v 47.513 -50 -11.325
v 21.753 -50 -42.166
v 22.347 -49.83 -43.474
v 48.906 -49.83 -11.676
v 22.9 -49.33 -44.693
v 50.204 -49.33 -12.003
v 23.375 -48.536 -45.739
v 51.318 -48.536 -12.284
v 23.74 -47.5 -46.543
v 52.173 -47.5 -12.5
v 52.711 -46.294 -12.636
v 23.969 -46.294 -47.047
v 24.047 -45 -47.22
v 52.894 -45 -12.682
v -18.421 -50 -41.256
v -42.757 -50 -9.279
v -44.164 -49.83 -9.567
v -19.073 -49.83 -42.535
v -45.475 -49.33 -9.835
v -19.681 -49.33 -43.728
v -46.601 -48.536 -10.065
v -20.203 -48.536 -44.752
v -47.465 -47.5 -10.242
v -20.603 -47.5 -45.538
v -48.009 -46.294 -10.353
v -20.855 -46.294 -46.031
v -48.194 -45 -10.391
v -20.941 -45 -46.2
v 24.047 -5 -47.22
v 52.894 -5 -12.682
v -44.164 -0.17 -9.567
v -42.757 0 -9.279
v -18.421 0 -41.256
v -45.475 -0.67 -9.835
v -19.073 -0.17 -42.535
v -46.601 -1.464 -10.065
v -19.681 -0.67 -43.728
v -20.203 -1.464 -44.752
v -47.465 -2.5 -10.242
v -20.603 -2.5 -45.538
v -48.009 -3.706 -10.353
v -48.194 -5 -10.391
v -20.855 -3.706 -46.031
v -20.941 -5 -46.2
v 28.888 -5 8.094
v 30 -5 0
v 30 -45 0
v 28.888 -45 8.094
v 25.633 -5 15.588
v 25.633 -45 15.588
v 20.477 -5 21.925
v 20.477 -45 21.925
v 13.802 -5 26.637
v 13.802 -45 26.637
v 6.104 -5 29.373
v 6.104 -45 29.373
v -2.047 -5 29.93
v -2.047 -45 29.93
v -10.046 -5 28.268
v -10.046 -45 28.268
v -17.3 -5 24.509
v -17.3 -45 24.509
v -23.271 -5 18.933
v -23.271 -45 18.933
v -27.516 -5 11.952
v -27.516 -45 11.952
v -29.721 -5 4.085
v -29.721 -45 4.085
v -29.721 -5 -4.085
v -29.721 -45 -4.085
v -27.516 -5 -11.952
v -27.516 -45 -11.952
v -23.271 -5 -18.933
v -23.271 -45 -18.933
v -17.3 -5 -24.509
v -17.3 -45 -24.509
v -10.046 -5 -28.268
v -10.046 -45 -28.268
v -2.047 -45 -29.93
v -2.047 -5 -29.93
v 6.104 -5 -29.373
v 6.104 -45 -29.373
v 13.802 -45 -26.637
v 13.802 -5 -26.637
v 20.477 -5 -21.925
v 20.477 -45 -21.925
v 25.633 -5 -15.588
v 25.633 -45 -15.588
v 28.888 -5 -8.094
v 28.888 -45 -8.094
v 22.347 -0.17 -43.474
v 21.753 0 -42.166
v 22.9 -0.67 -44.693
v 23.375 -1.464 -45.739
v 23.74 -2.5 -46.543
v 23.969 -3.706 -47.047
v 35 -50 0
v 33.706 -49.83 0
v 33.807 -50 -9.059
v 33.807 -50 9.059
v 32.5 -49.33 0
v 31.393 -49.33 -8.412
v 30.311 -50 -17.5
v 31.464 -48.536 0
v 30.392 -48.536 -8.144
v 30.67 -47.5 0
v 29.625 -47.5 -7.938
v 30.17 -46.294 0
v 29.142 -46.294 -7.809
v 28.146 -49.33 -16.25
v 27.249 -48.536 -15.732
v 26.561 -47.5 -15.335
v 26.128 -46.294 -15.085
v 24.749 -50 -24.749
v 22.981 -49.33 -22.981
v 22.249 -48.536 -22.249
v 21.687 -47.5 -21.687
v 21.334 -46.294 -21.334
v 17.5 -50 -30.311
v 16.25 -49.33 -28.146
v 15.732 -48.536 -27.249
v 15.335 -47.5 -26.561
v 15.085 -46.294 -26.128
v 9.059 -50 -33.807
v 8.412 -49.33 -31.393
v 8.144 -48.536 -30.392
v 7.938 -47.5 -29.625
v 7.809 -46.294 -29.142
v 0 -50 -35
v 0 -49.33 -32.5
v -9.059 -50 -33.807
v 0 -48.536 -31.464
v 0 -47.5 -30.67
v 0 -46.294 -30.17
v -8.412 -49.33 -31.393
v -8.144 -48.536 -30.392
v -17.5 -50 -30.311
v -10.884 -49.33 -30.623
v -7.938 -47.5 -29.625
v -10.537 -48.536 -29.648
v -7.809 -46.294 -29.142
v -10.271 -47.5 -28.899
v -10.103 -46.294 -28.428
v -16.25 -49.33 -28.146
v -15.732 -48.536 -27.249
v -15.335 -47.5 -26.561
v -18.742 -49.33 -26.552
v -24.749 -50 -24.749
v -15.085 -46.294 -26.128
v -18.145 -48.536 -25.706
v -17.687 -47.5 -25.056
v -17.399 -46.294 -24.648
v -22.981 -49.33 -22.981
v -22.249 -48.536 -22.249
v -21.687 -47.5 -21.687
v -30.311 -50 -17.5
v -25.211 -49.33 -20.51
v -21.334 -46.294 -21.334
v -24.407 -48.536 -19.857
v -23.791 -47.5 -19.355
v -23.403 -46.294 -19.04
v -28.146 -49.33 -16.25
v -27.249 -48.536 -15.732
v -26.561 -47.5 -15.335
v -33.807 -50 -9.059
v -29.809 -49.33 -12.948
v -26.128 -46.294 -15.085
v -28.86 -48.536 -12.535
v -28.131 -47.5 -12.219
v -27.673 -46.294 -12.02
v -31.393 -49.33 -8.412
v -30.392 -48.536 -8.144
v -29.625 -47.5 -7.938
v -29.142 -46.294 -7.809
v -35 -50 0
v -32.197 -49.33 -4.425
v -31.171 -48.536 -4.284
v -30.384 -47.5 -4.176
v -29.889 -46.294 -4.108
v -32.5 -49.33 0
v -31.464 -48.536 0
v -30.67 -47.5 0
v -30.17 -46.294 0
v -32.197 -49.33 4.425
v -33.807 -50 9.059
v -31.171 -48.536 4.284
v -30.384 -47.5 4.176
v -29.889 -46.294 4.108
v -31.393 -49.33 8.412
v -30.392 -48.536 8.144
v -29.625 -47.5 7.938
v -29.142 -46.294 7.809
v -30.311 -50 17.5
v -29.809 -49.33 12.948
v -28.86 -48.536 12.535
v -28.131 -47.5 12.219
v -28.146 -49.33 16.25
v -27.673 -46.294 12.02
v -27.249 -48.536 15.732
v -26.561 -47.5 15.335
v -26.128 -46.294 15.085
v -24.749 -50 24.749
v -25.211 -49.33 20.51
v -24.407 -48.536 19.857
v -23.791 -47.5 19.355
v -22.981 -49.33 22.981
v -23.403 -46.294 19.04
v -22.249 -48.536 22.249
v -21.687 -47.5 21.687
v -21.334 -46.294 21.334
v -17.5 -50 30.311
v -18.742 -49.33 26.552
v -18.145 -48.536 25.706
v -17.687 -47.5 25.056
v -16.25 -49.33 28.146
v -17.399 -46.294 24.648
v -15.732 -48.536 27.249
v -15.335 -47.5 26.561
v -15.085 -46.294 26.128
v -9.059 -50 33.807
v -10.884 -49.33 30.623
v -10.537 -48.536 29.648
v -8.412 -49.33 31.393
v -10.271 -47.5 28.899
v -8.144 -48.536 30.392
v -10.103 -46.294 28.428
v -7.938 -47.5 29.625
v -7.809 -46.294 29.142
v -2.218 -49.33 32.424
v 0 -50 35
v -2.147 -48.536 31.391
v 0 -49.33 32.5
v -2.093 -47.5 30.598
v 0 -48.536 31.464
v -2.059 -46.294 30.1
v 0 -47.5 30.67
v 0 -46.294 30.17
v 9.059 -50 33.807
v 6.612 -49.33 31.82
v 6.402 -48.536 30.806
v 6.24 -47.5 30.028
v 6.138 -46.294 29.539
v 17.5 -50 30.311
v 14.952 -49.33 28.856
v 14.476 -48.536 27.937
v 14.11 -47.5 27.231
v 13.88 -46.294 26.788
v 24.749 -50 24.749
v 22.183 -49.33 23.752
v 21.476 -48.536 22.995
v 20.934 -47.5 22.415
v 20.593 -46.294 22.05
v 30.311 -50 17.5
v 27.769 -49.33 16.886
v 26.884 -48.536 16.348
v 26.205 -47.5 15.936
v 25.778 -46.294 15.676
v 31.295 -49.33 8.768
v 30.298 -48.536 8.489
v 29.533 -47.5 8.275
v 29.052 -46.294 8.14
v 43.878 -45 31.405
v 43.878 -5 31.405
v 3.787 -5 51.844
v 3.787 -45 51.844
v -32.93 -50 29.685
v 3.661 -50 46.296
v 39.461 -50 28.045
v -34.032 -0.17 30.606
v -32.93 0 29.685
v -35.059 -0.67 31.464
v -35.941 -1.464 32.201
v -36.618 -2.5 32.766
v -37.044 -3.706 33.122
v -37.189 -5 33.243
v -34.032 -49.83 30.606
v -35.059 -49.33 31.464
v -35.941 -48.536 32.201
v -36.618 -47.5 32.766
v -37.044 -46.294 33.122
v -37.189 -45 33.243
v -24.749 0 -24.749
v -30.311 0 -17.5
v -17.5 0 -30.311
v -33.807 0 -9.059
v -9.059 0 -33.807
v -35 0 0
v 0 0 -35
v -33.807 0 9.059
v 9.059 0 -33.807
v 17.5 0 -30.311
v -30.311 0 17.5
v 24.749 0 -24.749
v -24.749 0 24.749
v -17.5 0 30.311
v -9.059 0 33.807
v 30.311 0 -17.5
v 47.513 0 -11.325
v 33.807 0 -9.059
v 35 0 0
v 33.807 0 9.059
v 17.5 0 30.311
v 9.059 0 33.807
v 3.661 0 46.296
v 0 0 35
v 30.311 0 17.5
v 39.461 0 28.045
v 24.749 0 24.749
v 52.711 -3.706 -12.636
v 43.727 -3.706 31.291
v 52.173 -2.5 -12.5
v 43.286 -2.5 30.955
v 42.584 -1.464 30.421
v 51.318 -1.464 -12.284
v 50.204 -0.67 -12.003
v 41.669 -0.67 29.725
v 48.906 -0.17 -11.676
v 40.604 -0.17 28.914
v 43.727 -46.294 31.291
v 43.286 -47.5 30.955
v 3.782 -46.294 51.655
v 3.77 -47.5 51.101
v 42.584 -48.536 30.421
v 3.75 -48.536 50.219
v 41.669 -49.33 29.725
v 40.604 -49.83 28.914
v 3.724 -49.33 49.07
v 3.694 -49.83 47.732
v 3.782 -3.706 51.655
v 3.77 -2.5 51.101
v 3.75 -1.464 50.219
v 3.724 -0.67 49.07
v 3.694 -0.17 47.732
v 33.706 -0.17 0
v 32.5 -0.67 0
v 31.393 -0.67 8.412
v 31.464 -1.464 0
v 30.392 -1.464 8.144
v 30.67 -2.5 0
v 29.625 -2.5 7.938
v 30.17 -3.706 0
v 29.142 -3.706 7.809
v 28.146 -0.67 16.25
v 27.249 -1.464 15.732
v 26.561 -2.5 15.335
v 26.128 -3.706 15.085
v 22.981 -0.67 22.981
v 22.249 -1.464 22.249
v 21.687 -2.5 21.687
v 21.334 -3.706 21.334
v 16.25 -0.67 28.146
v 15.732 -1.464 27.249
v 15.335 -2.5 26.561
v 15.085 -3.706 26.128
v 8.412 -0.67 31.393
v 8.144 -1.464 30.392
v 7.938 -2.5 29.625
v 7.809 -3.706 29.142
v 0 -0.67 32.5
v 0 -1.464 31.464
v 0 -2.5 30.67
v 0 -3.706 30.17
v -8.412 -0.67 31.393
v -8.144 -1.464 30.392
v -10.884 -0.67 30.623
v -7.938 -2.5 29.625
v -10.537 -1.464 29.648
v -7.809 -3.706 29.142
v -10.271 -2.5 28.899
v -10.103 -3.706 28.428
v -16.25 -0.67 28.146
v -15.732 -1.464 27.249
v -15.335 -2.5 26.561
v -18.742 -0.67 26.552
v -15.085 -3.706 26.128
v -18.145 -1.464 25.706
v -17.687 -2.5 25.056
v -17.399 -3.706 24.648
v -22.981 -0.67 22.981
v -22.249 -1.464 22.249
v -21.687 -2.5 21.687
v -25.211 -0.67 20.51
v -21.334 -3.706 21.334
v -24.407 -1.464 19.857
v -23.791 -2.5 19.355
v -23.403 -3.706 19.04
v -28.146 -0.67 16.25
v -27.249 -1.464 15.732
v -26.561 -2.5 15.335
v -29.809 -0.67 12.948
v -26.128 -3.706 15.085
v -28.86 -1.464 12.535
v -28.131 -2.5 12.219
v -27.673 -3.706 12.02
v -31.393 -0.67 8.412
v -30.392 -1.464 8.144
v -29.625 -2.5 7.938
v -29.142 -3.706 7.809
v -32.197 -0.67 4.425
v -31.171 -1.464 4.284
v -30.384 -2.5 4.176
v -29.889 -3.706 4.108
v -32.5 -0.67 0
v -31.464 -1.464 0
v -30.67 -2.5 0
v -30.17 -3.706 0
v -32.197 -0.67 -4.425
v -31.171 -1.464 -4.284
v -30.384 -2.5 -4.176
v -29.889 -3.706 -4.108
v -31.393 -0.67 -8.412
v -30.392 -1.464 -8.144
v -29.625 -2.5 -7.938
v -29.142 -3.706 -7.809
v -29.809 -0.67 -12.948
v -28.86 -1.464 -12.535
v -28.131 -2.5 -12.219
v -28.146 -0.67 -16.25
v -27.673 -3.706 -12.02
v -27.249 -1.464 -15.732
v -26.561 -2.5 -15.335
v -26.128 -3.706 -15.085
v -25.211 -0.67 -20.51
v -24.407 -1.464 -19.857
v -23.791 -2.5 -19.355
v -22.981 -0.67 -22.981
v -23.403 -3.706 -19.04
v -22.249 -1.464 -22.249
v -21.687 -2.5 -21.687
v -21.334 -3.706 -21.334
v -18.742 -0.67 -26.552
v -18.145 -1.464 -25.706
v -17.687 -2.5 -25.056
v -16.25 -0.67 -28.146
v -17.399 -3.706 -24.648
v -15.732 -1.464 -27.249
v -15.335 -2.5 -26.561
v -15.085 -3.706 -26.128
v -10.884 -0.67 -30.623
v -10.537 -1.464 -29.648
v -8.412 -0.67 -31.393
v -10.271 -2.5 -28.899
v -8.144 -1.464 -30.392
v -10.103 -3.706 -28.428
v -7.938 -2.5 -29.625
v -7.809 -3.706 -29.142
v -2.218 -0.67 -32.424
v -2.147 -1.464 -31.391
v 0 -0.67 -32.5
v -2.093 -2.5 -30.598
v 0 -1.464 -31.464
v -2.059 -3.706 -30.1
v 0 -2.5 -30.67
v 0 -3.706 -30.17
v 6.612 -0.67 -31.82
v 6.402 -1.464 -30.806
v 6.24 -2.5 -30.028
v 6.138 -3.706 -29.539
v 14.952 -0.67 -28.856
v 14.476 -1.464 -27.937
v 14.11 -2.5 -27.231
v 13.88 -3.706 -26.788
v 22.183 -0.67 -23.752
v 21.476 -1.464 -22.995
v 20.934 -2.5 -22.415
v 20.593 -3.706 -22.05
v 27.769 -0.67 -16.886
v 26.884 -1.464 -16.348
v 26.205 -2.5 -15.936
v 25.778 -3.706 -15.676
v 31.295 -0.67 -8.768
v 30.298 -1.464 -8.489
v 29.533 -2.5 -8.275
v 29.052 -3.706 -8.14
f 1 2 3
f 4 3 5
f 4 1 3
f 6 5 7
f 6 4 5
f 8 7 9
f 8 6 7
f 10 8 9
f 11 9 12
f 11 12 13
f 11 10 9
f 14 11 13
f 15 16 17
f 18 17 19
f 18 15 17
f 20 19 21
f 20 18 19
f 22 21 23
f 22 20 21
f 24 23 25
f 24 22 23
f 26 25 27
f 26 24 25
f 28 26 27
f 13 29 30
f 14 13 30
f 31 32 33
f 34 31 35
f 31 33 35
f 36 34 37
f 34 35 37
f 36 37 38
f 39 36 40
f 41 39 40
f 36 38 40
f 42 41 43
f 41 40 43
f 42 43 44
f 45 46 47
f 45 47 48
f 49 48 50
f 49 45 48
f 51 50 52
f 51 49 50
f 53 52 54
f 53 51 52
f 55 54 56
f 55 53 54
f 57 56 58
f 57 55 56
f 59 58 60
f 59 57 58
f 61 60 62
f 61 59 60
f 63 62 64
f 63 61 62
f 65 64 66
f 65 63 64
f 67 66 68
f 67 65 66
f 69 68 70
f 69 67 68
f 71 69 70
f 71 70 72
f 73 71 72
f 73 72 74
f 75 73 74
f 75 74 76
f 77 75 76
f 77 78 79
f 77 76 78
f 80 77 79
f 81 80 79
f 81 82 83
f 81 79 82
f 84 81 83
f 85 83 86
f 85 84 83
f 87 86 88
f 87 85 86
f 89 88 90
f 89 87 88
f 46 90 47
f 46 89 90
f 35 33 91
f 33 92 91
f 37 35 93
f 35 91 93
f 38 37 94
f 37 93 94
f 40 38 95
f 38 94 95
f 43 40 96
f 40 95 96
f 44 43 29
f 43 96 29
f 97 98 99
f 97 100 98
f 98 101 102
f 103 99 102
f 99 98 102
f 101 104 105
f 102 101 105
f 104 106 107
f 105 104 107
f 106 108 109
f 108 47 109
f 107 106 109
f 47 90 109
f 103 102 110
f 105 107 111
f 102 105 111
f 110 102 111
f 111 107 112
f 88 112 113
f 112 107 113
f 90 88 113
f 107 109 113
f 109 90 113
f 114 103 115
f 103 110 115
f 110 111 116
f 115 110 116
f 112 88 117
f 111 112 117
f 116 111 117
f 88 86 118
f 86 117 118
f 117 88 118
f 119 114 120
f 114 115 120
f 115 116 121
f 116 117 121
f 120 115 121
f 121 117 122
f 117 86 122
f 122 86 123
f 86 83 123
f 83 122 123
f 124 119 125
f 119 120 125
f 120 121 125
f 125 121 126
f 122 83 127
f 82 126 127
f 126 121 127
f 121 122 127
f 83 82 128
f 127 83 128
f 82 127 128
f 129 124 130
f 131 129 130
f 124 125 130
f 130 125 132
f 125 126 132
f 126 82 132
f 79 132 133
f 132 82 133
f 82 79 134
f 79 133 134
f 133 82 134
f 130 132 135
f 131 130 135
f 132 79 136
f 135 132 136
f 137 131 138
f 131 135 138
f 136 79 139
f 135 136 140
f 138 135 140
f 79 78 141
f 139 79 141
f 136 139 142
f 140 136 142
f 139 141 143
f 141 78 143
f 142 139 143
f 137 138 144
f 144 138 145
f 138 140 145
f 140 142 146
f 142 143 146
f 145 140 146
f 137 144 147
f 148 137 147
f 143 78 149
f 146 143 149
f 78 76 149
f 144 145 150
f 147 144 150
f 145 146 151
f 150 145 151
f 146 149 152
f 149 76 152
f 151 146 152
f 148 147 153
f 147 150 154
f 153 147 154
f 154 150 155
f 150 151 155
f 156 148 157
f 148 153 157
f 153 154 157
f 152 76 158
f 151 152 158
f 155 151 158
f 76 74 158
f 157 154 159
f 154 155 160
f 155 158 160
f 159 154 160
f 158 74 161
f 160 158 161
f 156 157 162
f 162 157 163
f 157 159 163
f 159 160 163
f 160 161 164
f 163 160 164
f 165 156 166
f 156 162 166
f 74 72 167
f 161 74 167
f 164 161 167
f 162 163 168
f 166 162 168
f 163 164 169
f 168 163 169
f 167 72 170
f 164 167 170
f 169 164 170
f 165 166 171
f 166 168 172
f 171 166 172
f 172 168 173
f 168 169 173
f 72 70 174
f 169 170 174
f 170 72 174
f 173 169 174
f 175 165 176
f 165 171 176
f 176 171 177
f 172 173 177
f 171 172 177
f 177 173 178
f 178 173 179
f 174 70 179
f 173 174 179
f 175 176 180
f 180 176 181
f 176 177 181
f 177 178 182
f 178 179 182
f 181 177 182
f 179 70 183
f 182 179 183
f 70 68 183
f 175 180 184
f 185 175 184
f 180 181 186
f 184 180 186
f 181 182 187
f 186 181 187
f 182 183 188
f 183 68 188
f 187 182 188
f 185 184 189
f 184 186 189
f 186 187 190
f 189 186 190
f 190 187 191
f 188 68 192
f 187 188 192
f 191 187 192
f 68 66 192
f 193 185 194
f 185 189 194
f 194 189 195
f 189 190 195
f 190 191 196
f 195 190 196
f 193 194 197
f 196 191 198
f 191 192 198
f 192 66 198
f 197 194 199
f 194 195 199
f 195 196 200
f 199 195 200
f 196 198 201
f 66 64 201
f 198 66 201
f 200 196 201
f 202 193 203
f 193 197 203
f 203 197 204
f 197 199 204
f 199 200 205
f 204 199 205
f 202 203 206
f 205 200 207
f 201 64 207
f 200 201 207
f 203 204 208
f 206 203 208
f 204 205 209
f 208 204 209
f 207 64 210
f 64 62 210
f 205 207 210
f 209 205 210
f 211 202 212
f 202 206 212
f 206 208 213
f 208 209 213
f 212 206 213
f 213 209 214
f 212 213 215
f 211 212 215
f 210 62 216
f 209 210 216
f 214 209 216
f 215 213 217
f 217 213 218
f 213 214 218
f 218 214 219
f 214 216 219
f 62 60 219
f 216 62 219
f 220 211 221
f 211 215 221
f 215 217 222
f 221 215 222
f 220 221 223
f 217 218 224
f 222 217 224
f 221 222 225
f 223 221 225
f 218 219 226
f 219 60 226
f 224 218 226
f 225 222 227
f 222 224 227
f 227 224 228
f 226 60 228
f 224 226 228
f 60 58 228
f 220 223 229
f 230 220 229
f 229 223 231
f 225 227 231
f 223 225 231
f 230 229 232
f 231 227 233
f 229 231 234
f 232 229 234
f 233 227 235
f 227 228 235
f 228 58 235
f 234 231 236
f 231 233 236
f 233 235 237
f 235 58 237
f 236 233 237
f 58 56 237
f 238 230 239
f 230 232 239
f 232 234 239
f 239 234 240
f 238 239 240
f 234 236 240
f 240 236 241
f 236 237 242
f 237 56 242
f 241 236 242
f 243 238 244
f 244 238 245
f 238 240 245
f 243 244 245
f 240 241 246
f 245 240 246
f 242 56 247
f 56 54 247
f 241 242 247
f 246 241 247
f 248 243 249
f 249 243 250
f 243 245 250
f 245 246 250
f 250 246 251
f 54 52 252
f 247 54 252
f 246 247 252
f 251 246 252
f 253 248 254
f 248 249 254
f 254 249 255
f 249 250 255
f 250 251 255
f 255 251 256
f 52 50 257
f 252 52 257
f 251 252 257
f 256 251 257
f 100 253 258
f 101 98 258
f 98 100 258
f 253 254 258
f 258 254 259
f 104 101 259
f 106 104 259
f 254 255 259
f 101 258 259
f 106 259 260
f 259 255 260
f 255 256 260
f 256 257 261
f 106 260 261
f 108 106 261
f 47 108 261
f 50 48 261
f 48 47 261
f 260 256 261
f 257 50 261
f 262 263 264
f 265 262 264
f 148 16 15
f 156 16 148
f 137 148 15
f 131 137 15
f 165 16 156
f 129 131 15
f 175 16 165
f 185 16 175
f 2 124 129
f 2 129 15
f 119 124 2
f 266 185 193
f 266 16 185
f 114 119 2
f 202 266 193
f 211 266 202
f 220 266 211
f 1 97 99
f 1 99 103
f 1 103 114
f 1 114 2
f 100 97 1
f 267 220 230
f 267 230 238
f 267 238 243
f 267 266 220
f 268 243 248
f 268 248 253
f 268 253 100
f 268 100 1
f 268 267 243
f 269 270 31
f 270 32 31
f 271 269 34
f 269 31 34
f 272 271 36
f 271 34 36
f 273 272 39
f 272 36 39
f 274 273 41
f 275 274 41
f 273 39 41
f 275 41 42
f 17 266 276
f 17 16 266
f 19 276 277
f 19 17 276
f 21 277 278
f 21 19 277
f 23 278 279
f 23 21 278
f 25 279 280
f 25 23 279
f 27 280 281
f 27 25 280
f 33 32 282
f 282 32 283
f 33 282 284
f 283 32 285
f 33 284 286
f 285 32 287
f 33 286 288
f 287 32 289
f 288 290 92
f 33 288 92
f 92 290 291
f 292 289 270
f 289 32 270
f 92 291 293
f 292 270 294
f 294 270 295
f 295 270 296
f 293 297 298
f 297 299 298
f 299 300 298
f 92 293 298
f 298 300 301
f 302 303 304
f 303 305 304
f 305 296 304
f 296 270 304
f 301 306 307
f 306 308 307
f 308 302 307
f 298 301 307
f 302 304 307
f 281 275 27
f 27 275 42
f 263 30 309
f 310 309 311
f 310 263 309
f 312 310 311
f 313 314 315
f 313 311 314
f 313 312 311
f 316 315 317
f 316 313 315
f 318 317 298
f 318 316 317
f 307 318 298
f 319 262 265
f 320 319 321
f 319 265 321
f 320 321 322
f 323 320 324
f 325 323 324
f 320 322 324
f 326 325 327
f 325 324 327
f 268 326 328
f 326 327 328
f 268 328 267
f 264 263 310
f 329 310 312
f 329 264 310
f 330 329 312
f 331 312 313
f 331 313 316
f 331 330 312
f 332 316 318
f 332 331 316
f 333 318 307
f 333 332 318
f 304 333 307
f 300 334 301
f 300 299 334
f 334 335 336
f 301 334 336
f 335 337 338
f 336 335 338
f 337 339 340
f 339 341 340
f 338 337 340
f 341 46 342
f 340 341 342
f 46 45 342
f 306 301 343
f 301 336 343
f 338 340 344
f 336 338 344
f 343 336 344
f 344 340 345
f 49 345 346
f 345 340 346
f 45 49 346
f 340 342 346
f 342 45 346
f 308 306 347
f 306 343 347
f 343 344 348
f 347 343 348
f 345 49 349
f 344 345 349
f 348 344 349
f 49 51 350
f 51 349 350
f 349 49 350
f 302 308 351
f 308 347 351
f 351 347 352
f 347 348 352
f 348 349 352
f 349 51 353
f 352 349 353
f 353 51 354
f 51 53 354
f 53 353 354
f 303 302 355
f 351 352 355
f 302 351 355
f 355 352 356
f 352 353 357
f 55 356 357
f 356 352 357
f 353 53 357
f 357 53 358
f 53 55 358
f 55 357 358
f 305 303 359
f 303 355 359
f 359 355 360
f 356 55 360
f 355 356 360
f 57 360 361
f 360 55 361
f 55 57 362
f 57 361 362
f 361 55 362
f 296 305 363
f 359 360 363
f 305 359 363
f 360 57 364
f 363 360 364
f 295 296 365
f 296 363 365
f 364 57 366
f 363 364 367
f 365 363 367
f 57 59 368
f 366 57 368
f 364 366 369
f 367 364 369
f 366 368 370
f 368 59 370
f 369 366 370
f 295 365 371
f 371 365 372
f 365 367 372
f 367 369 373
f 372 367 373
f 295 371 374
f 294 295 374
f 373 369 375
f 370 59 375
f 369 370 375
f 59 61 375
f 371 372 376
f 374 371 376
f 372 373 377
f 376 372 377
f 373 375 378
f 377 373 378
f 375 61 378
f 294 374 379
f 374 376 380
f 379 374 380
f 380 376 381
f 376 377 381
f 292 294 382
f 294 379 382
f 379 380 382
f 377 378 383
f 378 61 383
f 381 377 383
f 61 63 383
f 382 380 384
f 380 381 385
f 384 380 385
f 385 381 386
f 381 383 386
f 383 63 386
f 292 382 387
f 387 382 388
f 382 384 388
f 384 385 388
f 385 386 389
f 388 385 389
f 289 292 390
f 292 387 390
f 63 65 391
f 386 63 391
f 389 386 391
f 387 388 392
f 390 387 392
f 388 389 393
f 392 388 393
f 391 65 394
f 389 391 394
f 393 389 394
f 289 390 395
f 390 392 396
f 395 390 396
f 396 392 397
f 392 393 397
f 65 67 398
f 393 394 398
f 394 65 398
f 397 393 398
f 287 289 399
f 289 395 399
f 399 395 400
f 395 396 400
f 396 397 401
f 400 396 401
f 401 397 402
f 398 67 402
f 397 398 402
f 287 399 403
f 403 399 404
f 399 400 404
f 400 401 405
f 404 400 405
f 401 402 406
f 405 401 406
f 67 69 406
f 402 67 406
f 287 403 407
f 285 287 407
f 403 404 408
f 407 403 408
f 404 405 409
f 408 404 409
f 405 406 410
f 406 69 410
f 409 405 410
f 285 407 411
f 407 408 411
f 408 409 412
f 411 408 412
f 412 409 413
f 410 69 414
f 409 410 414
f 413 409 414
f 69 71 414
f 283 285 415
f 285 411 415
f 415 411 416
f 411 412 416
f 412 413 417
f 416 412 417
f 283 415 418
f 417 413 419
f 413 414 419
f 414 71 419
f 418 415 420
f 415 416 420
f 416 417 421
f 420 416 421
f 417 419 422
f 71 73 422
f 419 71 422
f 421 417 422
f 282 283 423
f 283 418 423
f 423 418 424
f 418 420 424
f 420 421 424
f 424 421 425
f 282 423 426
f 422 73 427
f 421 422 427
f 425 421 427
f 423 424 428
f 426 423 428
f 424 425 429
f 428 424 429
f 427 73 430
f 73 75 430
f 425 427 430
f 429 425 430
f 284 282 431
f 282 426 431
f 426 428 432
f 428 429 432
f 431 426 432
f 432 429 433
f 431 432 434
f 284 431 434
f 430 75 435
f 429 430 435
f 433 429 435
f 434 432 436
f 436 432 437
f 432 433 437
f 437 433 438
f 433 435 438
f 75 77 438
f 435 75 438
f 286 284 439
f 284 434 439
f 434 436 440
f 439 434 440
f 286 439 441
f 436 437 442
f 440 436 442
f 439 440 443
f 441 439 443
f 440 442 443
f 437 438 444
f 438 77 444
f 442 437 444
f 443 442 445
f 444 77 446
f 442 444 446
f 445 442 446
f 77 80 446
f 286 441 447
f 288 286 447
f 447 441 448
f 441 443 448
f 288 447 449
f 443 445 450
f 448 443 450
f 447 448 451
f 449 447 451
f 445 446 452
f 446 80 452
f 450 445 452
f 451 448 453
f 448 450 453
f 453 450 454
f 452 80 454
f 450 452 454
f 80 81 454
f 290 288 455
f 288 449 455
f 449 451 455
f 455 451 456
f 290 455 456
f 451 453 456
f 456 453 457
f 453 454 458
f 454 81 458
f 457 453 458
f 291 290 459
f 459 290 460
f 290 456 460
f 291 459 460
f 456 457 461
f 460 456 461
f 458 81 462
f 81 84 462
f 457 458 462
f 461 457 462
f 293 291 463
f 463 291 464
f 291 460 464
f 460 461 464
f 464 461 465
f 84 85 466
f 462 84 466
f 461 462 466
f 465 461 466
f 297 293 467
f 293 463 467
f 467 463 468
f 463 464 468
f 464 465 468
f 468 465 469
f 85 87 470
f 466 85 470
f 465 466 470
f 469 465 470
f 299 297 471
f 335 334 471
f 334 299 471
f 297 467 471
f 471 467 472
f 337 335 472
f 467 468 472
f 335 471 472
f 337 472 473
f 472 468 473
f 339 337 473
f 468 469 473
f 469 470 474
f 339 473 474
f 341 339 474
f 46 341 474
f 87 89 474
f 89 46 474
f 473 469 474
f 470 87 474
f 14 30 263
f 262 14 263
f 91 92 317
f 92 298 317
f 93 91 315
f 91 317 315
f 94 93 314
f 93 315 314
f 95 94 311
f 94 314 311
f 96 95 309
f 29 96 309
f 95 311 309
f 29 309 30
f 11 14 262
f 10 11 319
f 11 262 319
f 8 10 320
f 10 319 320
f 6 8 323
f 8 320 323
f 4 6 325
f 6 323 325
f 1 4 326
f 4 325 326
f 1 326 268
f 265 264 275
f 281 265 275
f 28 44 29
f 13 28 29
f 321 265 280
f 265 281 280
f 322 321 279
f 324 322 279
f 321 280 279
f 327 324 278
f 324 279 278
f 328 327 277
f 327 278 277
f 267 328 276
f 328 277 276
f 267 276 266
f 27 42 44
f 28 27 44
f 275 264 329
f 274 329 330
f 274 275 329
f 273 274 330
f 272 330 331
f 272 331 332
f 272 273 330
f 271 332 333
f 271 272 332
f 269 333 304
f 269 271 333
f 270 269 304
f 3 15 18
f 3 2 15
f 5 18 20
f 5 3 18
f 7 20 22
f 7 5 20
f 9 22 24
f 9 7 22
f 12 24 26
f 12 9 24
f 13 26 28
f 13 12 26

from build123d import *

# Parameters (mm, degrees)
F1_DEPTH = 50
F2_R     = 30
F3_DEPTH = 50.001
F4_R     = 5


with BuildPart() as f1:
    # F0 (on Front) → F1 (new body)
    with BuildSketch(Plane.XZ):
        Polygon((43.8775578274, 31.4054595038), (3.7867815374, 51.8438952675), (-37.1888211604, 33.242820472), (-48.1937856847, -10.3907761688), (-20.9411492883, -46.1999064214), (24.0472969699, -47.2195648323), (52.8943354603, -12.6819278209), align=None)
    extrude(amount=F1_DEPTH)

    # F2 (on Front) → F3 (cut, through all)
    with BuildSketch(Plane.XZ):
        Circle(F2_R)
    extrude(amount=F3_DEPTH, mode=Mode.SUBTRACT)

    # F4
    f4_edges = [f1.edges().sort_by_distance(p)[0] for p in [
        (38.470816, -50, -29.950746),
        (1.553074, -50, -46.709736),
        (48.385947, -50, 9.361766),
        (-34.567467, -50, -28.295341),
        (23.83217, -50, 41.624677),
        (-42.691303, -50, 11.426022),
        (-16.70102, -50, 42.543358),
        (-30, -50, 0),
        (38.470816, 0, -29.950746),
        (1.553074, 0, -46.709736),
        (48.385947, 0, 9.361766),
        (-34.567467, 0, -28.295341),
        (23.83217, 0, 41.624677),
        (-42.691303, 0, 11.426022),
        (-16.70102, 0, 42.543358),
        (-30, 0, 0),
    ]]
    fillet(f4_edges, radius=F4_R)


solid = f1.part
